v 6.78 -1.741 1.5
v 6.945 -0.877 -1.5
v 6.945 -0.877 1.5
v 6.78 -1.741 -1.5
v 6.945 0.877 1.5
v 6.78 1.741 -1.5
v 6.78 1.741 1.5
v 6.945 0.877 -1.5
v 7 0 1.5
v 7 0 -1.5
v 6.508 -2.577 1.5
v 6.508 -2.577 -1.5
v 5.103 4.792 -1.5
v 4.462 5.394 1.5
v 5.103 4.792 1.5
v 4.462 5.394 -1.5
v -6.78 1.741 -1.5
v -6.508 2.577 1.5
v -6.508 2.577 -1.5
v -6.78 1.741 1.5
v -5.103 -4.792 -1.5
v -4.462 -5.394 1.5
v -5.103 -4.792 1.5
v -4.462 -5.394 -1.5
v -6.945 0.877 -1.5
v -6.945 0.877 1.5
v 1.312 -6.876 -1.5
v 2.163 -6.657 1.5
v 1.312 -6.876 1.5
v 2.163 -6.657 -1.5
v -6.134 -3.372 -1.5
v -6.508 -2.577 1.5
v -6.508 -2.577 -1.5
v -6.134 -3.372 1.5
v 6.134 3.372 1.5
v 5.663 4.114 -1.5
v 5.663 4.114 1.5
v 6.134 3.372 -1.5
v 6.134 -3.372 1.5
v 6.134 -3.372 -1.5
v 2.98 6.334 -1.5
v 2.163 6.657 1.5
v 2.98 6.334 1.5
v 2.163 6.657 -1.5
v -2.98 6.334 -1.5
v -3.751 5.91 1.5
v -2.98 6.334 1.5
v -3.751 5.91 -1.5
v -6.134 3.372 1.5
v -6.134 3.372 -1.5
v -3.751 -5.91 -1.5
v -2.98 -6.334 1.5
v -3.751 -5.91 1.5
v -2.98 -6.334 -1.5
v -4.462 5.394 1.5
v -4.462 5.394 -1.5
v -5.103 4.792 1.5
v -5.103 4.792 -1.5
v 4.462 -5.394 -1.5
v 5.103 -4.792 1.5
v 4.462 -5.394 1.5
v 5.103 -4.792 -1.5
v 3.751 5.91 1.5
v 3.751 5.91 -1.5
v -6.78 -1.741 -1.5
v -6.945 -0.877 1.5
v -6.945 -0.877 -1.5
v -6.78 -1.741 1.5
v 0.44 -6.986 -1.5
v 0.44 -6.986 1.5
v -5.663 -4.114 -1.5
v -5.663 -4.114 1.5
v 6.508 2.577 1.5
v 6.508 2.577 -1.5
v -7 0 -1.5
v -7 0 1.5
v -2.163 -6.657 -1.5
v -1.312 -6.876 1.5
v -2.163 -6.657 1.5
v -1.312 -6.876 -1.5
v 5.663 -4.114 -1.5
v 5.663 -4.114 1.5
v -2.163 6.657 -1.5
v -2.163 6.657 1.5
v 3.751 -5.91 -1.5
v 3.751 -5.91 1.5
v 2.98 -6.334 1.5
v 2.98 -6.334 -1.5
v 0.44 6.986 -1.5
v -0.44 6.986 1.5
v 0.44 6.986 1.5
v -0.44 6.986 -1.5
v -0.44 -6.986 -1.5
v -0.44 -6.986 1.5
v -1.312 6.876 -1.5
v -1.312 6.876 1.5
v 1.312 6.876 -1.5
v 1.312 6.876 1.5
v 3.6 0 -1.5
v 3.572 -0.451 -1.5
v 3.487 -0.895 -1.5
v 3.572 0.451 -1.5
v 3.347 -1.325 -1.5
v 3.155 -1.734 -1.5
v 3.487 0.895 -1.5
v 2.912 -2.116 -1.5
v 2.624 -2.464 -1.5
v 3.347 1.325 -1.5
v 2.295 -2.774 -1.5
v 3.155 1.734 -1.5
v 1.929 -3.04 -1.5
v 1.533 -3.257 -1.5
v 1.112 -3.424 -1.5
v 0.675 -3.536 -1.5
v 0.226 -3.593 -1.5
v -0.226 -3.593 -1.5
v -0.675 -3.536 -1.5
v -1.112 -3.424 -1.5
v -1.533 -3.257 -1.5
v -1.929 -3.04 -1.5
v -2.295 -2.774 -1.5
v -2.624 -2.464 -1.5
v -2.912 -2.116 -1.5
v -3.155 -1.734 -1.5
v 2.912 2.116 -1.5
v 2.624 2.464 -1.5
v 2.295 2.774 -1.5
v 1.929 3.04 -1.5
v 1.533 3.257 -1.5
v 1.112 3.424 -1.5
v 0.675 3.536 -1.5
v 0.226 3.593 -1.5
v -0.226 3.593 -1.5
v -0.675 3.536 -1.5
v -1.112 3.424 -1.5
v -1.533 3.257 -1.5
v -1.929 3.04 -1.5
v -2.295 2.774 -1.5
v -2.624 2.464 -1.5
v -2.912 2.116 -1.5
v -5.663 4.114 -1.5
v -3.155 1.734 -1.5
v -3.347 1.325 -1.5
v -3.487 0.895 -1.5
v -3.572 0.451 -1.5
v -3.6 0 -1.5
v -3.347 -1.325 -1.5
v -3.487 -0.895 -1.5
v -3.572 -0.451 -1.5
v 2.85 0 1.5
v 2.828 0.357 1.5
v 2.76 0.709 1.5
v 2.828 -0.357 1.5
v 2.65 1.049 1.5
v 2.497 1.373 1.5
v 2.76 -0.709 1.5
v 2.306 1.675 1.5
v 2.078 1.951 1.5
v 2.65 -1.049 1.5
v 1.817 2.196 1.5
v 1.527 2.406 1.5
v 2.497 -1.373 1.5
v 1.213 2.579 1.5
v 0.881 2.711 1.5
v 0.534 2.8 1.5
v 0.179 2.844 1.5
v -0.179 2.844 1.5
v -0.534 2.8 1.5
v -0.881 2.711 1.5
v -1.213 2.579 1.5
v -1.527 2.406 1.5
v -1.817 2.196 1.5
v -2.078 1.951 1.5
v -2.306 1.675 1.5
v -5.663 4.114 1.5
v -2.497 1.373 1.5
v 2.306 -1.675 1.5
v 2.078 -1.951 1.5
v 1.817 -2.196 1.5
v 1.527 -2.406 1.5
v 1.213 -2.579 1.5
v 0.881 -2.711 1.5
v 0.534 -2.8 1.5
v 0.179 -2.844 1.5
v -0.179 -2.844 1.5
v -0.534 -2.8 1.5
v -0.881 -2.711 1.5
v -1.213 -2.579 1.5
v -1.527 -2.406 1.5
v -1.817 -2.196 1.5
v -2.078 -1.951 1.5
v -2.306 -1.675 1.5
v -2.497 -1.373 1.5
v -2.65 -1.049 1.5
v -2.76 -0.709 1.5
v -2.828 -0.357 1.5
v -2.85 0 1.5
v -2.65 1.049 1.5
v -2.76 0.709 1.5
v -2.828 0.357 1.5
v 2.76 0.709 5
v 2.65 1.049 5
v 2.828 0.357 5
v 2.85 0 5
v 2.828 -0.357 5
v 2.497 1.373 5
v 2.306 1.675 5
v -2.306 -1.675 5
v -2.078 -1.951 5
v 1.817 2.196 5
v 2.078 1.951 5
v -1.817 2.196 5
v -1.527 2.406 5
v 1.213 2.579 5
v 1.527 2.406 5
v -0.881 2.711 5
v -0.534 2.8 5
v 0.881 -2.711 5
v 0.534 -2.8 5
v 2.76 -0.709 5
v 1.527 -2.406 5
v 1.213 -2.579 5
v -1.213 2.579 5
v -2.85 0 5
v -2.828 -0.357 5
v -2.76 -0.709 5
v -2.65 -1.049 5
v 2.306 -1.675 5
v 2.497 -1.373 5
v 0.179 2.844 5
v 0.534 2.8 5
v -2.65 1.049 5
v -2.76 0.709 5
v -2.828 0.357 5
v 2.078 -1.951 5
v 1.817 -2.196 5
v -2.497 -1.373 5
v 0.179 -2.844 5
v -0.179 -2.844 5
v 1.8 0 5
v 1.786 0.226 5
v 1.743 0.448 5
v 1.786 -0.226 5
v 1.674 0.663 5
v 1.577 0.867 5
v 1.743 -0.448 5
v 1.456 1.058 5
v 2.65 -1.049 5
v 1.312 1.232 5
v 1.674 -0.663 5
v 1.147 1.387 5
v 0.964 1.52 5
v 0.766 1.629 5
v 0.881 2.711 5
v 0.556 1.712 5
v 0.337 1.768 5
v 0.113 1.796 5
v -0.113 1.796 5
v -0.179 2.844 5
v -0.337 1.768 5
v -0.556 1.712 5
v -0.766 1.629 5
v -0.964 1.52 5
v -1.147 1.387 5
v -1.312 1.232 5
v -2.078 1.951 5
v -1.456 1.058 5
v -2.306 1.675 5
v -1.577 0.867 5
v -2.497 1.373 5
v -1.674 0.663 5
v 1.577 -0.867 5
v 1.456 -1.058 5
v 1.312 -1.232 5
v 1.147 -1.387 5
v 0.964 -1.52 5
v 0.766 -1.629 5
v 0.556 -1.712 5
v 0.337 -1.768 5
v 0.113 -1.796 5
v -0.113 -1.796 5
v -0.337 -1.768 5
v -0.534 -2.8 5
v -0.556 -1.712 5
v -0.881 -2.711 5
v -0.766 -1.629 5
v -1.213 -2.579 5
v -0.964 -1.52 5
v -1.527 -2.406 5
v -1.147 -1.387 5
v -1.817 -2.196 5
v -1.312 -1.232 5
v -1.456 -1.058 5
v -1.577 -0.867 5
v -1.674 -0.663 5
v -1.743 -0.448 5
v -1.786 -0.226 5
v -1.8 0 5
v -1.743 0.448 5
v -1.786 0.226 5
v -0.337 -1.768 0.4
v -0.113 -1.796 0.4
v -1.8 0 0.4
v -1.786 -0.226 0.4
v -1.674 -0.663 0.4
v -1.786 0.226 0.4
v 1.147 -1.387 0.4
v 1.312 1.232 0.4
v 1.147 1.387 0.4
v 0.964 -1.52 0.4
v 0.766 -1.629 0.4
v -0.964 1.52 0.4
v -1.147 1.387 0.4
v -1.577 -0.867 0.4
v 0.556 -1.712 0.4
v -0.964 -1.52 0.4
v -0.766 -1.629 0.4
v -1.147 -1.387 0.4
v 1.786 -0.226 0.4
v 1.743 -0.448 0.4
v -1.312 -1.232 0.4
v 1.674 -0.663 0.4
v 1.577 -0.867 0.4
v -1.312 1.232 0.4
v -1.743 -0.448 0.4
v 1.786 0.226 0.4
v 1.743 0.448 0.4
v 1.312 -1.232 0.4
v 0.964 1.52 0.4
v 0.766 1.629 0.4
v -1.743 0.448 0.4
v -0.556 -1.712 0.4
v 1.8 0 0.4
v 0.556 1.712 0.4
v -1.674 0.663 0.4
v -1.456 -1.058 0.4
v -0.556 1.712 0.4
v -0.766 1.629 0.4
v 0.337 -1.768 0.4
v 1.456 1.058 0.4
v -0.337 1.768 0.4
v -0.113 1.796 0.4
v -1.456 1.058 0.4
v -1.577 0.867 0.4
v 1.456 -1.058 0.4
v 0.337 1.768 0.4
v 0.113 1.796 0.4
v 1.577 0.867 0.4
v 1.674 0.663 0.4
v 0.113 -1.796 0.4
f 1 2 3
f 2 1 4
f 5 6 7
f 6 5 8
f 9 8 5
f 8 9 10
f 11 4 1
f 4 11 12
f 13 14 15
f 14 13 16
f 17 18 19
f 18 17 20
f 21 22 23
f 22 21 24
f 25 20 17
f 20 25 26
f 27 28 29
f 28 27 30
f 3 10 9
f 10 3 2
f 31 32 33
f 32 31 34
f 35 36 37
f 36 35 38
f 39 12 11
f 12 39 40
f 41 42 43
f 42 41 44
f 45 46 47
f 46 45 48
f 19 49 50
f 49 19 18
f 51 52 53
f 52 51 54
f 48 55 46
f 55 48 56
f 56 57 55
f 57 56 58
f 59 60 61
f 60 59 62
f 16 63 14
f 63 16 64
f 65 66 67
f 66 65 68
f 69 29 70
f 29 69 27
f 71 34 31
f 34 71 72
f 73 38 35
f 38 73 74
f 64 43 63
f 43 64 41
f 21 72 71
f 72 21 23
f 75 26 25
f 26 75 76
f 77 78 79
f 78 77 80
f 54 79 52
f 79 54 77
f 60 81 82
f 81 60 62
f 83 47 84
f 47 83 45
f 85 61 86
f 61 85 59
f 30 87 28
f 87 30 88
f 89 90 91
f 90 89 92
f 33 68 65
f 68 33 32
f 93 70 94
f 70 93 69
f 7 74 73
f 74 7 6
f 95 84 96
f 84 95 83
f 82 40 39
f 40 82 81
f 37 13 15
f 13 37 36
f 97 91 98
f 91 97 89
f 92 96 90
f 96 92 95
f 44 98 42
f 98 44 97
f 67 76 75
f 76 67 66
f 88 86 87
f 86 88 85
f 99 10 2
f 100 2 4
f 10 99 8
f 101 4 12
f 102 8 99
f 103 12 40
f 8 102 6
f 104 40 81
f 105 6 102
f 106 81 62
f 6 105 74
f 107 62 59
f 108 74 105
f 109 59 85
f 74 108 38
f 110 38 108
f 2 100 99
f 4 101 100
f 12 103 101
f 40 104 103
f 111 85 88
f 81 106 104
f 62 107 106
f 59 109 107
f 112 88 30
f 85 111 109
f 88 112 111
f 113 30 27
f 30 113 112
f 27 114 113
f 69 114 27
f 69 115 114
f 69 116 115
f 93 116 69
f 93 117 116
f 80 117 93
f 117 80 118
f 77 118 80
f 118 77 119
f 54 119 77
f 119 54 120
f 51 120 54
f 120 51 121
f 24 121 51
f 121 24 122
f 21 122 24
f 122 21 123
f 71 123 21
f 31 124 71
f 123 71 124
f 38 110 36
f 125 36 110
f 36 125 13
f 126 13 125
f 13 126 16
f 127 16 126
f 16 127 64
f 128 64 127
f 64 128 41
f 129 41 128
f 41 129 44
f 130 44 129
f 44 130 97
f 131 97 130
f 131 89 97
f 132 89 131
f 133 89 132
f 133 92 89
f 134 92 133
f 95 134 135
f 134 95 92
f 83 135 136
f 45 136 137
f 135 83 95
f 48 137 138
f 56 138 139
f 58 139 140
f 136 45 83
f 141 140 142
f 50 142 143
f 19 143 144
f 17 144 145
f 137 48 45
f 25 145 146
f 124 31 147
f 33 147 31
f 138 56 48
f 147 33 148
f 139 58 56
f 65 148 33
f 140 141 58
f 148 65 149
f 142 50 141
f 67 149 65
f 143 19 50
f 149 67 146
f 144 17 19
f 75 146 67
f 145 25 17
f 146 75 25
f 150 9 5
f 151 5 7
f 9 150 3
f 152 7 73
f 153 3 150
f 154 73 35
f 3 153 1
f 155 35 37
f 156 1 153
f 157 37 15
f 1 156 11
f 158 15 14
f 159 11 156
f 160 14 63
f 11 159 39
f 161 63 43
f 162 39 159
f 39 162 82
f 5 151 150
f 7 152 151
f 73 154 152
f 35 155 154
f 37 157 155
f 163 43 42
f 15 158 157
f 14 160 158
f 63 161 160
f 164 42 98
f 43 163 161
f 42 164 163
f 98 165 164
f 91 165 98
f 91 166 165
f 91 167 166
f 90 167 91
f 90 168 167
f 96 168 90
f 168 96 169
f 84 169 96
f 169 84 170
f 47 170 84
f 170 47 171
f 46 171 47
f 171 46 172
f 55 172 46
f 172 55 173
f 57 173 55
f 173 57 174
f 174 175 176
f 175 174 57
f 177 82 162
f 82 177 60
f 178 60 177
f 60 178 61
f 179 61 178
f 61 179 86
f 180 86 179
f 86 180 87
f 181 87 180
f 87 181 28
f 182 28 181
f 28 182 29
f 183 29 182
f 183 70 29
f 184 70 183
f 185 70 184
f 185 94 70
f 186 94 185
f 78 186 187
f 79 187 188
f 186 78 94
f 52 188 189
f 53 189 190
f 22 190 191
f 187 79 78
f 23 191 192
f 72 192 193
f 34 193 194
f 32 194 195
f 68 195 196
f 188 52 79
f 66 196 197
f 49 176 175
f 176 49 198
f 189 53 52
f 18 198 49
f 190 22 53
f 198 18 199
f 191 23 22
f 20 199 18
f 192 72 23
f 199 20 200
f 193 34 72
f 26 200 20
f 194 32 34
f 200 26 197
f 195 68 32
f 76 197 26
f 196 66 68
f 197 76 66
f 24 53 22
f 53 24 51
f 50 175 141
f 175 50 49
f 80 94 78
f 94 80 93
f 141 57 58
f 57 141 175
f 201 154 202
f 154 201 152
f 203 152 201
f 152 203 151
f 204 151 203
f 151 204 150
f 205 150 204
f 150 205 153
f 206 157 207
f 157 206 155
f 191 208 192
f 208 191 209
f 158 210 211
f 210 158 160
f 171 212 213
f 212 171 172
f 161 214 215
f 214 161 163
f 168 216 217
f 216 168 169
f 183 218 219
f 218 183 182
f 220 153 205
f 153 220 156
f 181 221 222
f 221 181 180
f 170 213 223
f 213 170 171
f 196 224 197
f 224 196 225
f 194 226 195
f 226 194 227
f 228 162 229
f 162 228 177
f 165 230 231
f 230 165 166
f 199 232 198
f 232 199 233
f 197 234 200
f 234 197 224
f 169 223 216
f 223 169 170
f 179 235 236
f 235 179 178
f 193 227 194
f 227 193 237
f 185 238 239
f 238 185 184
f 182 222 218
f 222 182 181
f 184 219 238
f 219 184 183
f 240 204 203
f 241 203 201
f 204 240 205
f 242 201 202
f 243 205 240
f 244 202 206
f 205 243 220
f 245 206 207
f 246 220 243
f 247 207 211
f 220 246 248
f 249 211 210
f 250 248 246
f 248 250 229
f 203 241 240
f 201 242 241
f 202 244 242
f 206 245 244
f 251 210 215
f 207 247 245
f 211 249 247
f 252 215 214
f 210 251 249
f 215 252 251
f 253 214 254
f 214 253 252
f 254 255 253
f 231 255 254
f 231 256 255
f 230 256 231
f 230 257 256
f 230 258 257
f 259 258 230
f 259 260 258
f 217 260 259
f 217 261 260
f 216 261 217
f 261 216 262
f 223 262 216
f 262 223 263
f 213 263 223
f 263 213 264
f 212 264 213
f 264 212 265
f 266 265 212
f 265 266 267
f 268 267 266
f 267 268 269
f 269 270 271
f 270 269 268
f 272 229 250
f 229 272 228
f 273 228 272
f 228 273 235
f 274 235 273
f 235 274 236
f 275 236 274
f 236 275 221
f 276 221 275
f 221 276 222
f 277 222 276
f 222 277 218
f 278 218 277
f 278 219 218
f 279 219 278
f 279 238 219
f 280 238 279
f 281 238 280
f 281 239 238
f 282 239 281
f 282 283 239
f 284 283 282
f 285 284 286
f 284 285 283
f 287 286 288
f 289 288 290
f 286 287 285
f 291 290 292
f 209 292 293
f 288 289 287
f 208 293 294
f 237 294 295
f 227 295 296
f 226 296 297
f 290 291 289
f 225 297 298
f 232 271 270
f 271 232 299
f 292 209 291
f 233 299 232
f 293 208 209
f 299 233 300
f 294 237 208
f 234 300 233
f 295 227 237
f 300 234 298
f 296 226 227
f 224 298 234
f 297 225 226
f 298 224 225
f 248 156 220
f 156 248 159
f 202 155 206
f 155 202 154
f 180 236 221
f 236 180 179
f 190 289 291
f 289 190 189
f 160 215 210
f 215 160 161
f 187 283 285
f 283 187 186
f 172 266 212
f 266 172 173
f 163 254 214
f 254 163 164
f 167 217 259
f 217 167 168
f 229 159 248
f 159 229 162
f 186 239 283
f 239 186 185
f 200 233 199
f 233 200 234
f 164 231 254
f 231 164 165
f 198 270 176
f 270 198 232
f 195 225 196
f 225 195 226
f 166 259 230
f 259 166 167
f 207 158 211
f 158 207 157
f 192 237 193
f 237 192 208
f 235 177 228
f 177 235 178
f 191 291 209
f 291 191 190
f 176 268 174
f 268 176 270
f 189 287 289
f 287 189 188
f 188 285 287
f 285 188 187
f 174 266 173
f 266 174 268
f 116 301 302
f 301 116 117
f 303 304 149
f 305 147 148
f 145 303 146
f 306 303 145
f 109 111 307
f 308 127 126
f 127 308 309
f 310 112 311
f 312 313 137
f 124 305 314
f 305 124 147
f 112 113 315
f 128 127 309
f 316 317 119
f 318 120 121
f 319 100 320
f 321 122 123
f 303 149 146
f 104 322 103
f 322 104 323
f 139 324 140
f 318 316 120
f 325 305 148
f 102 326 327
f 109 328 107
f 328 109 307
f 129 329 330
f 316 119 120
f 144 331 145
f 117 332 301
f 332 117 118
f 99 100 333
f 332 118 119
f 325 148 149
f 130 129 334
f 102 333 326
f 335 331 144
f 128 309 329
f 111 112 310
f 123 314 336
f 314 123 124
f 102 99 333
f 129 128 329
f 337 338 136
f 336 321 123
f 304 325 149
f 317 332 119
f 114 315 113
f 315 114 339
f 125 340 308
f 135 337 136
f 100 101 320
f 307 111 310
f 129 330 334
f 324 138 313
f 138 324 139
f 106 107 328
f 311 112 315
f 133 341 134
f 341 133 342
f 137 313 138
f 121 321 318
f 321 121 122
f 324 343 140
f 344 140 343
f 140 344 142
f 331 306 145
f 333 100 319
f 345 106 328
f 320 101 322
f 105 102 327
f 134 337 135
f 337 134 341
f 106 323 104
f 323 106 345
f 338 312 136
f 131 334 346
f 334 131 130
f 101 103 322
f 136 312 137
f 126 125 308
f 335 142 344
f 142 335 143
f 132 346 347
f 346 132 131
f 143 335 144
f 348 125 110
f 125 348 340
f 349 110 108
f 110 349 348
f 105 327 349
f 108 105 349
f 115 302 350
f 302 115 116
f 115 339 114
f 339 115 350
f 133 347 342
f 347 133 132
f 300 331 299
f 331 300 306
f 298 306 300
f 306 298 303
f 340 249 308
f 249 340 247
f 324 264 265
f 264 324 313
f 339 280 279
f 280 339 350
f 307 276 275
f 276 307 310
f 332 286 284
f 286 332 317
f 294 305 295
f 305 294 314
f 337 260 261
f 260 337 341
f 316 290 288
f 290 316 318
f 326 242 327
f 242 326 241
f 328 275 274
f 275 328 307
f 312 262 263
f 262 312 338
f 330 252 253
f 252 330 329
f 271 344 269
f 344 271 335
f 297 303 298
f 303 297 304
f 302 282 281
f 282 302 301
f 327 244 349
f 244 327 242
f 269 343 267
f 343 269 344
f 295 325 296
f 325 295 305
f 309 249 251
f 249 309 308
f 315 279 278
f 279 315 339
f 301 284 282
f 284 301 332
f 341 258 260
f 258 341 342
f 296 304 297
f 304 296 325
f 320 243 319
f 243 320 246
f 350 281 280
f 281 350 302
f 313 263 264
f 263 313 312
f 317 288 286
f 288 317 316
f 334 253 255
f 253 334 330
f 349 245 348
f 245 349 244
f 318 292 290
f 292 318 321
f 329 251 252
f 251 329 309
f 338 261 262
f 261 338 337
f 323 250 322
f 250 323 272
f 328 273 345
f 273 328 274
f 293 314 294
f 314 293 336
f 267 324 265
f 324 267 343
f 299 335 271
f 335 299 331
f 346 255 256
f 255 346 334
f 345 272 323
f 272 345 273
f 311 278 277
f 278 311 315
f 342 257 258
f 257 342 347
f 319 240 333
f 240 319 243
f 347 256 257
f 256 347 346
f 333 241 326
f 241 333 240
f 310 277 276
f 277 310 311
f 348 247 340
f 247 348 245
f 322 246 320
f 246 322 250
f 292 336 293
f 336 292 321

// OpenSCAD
$fn = 50;


difference() {
	union() {
		translate(v = [0, 0, -1.5000000000]) {
			cylinder(h = 3, r = 7.0000000000);
		}
		translate(v = [0, 0, -1.5000000000]) {
			cylinder(h = 6.5000000000, r = 2.8500000000);
		}
	}
	union() {
		translate(v = [0, 0, -1.5000000000]) {
			rotate(a = [0, 180, 0]) {
				difference() {
					union() {
						translate(v = [0, 0, -6.5000000000]) {
							cylinder(h = 6.5000000000, r = 1.5000000000);
						}
						translate(v = [0, 0, -1.9000000000]) {
							cylinder(h = 1.9000000000, r1 = 1.8000000000, r2 = 3.6000000000);
						}
						translate(v = [0, 0, -6.5000000000]) {
							cylinder(h = 6.5000000000, r = 1.8000000000);
						}
						translate(v = [0, 0, -6.5000000000]) {
							cylinder(h = 6.5000000000, r = 1.5000000000);
						}
					}
					union();
				}
			}
		}
		translate(v = [0, 0, -100.0000000000]) {
			cylinder(h = 200, r = 1.8000000000);
		}
	}
}
